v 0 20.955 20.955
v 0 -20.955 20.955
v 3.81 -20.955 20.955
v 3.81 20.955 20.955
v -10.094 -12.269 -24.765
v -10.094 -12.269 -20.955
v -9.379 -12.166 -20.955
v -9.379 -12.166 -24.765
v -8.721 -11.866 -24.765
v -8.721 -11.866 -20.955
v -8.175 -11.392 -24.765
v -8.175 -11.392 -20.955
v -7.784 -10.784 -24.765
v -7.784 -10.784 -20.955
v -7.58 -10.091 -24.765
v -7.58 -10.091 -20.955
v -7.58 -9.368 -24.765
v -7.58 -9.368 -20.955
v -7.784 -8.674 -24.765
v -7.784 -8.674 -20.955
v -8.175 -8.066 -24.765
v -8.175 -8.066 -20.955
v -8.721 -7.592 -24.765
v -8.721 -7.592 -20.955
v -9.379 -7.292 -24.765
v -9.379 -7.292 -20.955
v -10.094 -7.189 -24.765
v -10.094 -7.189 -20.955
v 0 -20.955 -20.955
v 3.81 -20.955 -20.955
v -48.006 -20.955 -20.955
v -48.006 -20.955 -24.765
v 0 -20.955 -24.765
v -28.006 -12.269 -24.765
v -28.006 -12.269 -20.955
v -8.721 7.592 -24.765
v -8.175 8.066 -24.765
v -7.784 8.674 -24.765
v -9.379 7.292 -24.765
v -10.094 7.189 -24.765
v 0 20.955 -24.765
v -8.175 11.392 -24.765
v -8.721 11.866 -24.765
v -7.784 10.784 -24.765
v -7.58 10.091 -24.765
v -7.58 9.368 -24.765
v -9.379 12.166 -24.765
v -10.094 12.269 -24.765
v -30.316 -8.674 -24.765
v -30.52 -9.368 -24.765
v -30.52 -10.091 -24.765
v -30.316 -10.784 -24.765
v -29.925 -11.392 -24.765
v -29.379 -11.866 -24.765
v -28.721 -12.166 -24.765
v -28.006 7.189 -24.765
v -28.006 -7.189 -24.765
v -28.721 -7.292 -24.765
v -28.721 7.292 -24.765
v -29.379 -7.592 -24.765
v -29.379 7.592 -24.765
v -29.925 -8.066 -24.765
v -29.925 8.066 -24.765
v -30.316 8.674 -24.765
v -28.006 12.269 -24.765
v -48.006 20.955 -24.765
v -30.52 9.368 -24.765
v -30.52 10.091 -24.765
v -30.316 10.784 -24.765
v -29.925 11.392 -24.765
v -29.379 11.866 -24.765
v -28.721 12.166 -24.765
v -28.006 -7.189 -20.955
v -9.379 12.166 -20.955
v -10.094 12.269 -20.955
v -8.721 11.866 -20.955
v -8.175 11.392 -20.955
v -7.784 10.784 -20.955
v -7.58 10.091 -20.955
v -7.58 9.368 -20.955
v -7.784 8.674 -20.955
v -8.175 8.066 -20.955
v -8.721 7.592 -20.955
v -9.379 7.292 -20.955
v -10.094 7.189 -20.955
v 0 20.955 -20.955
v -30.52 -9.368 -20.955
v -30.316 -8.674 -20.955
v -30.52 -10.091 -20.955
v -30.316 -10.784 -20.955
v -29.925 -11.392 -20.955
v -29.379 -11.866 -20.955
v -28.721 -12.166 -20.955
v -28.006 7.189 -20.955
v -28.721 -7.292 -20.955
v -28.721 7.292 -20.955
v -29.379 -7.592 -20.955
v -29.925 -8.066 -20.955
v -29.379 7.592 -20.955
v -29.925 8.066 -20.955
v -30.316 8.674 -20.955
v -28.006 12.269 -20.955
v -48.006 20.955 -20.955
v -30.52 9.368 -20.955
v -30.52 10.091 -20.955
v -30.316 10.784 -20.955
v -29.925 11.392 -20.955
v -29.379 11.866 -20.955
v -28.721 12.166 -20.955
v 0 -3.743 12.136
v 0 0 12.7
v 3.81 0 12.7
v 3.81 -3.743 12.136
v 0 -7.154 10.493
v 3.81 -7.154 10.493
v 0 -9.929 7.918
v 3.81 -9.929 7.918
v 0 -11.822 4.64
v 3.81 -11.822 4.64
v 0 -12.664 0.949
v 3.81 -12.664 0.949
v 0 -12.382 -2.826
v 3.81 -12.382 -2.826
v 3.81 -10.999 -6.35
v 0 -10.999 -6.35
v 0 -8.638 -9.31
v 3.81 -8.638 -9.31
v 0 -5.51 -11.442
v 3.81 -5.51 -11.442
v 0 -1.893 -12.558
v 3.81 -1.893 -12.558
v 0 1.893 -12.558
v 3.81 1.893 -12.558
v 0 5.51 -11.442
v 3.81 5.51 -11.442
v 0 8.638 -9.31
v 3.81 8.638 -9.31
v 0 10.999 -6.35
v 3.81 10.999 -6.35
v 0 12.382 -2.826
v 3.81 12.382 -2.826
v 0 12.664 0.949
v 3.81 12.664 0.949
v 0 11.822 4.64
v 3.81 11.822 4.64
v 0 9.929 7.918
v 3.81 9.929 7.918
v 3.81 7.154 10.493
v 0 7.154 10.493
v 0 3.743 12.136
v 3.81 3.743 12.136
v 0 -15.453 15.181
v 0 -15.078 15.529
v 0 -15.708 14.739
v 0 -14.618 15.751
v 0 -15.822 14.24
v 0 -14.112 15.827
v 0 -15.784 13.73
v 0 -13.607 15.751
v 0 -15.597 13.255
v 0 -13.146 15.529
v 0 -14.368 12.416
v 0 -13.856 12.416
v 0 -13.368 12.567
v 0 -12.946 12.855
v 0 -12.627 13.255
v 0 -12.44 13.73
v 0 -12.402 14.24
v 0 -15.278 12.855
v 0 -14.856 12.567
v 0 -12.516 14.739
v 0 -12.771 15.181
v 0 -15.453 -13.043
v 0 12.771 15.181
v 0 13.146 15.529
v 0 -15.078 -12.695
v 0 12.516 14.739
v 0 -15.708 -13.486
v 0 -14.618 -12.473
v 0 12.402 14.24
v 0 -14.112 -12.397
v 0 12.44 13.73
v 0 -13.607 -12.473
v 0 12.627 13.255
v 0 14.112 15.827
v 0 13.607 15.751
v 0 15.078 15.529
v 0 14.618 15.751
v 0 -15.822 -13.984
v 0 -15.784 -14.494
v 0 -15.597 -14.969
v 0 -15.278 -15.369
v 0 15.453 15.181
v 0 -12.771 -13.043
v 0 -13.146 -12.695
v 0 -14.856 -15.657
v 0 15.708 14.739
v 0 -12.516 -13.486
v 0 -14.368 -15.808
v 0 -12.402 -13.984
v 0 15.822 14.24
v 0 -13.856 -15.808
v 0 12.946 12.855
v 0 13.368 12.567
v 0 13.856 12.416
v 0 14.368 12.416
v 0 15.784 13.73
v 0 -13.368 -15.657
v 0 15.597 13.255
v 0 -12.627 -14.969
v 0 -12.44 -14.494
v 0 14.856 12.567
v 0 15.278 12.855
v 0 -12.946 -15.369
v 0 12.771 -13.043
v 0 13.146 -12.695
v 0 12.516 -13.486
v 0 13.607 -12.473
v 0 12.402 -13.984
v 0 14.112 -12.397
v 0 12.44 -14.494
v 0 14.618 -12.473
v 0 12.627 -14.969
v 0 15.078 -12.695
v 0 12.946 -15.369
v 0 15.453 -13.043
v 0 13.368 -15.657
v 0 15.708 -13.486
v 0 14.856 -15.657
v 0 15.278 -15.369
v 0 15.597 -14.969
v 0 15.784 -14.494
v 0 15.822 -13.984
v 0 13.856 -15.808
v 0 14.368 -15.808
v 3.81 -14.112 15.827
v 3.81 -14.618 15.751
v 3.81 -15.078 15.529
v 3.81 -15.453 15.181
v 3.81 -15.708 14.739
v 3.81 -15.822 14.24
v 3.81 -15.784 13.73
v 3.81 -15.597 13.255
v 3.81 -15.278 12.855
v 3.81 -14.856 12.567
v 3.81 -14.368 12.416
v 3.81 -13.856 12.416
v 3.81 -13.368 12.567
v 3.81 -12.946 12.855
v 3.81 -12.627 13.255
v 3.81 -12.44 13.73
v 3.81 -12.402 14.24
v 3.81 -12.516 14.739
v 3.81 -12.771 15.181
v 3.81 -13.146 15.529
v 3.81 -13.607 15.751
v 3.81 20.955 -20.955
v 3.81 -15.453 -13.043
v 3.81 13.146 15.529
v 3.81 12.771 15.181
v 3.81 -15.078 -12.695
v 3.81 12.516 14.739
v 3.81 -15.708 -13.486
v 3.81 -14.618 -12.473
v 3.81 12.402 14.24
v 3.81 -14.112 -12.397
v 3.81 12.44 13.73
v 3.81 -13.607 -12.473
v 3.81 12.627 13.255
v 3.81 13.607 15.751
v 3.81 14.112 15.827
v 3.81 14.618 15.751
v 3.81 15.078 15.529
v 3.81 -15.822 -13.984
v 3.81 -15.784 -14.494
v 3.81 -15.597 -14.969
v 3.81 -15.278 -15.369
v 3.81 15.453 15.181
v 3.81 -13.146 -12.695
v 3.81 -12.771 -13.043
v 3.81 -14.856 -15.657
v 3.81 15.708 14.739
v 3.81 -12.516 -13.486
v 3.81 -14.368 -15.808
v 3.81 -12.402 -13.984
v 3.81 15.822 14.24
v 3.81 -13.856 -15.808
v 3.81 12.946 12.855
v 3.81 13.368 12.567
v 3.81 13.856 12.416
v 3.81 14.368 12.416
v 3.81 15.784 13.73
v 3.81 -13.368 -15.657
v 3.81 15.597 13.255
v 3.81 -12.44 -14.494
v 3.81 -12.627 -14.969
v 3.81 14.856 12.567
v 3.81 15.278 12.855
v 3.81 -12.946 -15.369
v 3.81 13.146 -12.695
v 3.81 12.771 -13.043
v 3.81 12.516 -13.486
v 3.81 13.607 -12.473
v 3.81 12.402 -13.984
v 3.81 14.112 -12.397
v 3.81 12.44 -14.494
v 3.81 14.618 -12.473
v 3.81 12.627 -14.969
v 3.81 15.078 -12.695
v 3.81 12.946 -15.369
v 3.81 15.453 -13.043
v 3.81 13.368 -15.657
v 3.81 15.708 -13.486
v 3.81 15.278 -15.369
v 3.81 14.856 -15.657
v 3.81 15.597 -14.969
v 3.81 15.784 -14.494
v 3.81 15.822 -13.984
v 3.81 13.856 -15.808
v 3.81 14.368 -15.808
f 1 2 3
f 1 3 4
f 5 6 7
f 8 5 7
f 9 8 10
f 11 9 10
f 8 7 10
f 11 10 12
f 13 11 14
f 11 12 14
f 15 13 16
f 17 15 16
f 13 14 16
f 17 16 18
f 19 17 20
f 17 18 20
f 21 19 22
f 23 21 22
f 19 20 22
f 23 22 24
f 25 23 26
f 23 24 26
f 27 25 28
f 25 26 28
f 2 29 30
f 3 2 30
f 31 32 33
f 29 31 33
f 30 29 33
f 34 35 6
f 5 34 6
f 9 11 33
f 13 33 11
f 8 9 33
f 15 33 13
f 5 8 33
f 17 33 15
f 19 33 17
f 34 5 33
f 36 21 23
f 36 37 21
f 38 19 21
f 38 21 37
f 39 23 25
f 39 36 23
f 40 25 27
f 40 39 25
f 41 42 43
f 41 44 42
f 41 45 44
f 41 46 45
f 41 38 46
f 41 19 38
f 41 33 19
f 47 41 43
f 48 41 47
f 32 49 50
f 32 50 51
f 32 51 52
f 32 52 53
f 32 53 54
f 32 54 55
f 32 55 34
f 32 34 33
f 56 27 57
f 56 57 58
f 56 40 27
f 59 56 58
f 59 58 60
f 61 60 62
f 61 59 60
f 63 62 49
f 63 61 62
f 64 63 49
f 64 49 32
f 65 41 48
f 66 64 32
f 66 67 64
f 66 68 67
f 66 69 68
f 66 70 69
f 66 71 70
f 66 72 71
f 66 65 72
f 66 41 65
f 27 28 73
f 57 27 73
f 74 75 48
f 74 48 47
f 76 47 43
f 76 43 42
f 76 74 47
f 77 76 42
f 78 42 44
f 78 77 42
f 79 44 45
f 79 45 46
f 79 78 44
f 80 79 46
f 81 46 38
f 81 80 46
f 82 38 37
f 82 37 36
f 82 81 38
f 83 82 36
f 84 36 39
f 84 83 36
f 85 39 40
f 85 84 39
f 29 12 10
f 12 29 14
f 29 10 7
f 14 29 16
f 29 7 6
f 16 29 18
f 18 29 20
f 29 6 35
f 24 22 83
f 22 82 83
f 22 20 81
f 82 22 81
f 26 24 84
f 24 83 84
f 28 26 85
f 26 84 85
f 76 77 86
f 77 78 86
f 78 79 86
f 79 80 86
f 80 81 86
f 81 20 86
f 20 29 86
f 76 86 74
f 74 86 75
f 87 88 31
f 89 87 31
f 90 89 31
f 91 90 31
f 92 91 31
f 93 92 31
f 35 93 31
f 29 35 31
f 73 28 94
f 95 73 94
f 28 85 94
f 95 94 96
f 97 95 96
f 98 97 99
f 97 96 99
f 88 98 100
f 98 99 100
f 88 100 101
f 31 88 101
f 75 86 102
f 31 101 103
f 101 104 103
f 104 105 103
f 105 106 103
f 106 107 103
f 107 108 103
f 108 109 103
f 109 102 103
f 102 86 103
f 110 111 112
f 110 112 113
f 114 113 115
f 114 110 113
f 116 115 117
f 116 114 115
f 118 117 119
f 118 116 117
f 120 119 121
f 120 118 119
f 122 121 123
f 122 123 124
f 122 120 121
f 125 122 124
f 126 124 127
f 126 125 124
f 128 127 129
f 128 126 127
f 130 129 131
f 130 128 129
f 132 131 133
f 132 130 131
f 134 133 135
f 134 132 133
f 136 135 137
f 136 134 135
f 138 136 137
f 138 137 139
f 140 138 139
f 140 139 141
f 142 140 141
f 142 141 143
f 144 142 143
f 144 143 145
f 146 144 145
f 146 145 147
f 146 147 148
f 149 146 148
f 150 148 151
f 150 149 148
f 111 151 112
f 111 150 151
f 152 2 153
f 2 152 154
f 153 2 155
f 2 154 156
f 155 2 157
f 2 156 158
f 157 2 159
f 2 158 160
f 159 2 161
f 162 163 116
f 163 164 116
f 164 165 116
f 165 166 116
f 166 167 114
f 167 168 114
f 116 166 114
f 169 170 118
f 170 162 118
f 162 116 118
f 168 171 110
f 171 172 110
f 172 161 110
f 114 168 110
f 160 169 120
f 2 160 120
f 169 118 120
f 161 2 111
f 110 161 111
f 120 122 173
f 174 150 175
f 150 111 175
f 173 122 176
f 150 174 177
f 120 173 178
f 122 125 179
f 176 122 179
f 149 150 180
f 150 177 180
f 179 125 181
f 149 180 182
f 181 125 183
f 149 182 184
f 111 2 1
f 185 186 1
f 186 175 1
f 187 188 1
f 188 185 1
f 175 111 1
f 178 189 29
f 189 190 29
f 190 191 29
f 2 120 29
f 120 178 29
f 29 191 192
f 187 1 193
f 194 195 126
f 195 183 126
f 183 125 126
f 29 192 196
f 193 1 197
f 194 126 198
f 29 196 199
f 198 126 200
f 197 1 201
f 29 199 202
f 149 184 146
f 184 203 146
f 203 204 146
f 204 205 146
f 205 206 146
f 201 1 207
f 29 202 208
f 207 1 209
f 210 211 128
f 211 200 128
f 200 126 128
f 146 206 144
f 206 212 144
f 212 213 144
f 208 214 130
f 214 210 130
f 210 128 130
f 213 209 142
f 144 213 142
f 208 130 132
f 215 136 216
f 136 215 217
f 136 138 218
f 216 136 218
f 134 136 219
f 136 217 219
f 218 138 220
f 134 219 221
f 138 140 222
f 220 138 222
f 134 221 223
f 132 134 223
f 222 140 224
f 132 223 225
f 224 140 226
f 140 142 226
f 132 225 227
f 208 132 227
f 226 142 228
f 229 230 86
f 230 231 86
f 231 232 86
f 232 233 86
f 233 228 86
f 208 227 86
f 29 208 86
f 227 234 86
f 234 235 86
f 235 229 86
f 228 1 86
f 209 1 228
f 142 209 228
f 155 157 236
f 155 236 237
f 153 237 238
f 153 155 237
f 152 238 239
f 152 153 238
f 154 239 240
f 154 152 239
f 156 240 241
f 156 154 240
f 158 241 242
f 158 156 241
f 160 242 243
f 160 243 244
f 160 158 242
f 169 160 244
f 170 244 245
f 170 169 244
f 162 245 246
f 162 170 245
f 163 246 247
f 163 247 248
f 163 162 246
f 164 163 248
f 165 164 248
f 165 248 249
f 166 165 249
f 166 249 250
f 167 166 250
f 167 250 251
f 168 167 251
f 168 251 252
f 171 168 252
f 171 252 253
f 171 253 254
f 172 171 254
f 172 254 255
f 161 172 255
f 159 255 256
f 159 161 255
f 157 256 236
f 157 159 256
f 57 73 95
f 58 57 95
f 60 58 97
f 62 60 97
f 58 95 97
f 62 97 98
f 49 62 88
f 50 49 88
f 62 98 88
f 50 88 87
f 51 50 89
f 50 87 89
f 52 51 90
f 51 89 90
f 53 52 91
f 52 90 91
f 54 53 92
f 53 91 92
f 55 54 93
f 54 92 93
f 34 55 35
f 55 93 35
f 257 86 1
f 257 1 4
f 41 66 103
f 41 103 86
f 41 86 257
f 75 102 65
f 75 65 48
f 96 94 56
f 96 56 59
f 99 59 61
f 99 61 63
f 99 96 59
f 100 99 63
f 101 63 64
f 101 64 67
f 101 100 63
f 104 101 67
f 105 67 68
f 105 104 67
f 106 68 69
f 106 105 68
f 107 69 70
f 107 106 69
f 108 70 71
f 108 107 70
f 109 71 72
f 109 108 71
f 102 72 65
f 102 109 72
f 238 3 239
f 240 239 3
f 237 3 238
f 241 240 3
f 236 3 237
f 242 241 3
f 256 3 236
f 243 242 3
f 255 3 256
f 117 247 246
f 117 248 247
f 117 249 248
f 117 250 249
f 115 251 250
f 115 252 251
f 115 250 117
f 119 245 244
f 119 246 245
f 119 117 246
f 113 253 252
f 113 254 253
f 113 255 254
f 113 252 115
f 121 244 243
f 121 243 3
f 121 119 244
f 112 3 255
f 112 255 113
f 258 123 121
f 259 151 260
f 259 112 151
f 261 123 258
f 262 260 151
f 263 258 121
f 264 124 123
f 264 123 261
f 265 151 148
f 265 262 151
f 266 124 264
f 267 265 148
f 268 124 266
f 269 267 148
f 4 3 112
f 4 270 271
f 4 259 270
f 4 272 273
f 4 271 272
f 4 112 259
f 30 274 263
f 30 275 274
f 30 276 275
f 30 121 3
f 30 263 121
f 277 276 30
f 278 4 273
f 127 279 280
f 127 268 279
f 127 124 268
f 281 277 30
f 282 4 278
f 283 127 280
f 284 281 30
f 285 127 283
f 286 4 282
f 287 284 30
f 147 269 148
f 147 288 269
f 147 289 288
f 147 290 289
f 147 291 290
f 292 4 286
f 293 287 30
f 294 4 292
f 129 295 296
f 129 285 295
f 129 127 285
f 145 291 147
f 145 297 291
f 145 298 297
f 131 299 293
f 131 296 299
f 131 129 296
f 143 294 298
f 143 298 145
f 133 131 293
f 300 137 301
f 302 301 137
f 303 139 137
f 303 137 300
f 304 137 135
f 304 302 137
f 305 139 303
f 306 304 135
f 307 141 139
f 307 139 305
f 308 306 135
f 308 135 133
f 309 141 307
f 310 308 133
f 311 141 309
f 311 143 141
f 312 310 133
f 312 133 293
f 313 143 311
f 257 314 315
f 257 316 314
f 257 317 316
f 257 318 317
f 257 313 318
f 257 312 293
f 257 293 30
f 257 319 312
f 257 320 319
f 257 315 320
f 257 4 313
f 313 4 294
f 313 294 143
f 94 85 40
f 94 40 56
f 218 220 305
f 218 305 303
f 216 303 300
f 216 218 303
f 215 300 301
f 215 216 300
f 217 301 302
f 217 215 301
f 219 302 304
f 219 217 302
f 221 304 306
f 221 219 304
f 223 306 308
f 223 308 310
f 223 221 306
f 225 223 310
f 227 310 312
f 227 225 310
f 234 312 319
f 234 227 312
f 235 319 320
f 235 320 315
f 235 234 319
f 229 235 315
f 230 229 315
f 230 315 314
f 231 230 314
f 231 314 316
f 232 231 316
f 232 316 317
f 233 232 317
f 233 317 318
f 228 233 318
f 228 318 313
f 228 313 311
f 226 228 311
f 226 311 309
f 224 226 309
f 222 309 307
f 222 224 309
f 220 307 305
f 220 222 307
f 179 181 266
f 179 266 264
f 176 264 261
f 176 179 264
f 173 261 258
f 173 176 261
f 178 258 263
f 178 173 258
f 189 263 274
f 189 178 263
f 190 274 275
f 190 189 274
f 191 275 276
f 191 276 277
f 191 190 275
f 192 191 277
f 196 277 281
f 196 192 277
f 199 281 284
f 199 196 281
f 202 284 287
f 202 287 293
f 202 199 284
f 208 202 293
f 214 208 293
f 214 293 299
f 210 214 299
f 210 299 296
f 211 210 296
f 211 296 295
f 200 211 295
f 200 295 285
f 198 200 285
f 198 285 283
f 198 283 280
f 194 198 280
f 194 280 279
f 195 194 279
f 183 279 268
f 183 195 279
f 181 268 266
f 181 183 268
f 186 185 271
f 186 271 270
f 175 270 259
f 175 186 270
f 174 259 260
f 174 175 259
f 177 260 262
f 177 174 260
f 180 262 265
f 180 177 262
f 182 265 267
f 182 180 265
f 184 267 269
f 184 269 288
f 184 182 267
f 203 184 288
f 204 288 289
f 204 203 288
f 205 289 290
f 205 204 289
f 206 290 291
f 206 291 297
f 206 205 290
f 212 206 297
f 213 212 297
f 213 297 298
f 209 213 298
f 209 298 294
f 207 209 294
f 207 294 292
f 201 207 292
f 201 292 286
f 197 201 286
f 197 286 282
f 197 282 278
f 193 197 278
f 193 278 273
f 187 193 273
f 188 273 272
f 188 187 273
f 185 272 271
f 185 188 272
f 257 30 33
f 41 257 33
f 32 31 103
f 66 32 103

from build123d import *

# Parameters (mm, degrees)
SKETCH1_W           = 41.91
SKETCH1_H           = 41.91
SKETCH1_R           = 12.7
SKETCH1_R_2         = 1.714924581
BOSS_EXTRUDE1_DEPTH = 3.81
SKETCH2_W           = 48.006
SKETCH2_H           = 41.91
BOSS_EXTRUDE2_DEPTH = 3.81
LOFT1_START         = -20.955
LOFT1_DEPTH         = 41.91


# Read off the part's stored shape, not the designer's step: Loft1
with BuildPart() as part:
    # Sketch1 → Boss-Extrude1 (new body)
    with BuildSketch(Plane(origin=(0, 0, 0), x_dir=(0, 0, -1), z_dir=(1, 0, 0))):
        Rectangle(SKETCH1_W, SKETCH1_H)
        with Locations(Location((0, 0, 0), (0, 0, 180))):
            Circle(SKETCH1_R, mode=Mode.SUBTRACT)
        with Locations(Location((14.112032399, 14.112032399, 0), (0, 0, 180))):
            Circle(SKETCH1_R_2, mode=Mode.SUBTRACT)
        with Locations(Location((-14.112032399, -14.112032399, 0), (0, 0, 180))):
            Circle(SKETCH1_R_2, mode=Mode.SUBTRACT)
        with Locations(Location((-14.112032399, 14.112032399, 0), (0, 0, 180))):
            Circle(SKETCH1_R_2, mode=Mode.SUBTRACT)
        with Locations(Location((14.112032399, -14.112032399, 0), (0, 0, 180))):
            Circle(SKETCH1_R_2, mode=Mode.SUBTRACT)
    extrude(amount=BOSS_EXTRUDE1_DEPTH)



with BuildPart() as body_2:
    # Sketch2 → Boss-Extrude2 (new body)
    with BuildSketch(Plane(origin=(0, 0, -20.955), x_dir=(-1, 0, 0), z_dir=(0, 0, -1))):
        with Locations((24.003, 0)):
            Rectangle(SKETCH2_W, SKETCH2_H)
        with BuildLine():
            Line((10.094228129, 7.189050974), (28.005771871, 7.189050974))
            ThreePointArc((28.005771871, 7.189050974), (30.545771871, 9.729050974), (28.005771871, 12.269050974))
            Line((28.005771871, 12.269050974), (10.094228129, 12.269050974))
            ThreePointArc((10.094228129, 12.269050974), (7.554228129, 9.729050974), (10.094228129, 7.189050974))
        make_face(mode=Mode.SUBTRACT)
        with BuildLine():
            Line((10.094228129, -7.189050974), (28.005771871, -7.189050974))
            ThreePointArc((28.005771871, -7.189050974), (30.545771871, -9.729050974), (28.005771871, -12.269050974))
            Line((28.005771871, -12.269050974), (10.094228129, -12.269050974))
            ThreePointArc((10.094228129, -12.269050974), (7.554228129, -9.729050974), (10.094228129, -7.189050974))
        make_face(mode=Mode.SUBTRACT)
    extrude(amount=BOSS_EXTRUDE2_DEPTH)


with BuildPart() as part_1:
    add(part.part)

    add(body_2.part)  # Loft1 merges body 2
    # Loft1 outline → Loft1 (add)
    with BuildSketch(Plane(origin=(0, 0, 0), x_dir=(1, 0, 0), z_dir=(0, 1, 0)).offset(LOFT1_START)):
        Polygon((3.81, 20.955), (0, 24.765), (0, 20.955), align=None)
    extrude(amount=LOFT1_DEPTH)


solid = part_1.part
